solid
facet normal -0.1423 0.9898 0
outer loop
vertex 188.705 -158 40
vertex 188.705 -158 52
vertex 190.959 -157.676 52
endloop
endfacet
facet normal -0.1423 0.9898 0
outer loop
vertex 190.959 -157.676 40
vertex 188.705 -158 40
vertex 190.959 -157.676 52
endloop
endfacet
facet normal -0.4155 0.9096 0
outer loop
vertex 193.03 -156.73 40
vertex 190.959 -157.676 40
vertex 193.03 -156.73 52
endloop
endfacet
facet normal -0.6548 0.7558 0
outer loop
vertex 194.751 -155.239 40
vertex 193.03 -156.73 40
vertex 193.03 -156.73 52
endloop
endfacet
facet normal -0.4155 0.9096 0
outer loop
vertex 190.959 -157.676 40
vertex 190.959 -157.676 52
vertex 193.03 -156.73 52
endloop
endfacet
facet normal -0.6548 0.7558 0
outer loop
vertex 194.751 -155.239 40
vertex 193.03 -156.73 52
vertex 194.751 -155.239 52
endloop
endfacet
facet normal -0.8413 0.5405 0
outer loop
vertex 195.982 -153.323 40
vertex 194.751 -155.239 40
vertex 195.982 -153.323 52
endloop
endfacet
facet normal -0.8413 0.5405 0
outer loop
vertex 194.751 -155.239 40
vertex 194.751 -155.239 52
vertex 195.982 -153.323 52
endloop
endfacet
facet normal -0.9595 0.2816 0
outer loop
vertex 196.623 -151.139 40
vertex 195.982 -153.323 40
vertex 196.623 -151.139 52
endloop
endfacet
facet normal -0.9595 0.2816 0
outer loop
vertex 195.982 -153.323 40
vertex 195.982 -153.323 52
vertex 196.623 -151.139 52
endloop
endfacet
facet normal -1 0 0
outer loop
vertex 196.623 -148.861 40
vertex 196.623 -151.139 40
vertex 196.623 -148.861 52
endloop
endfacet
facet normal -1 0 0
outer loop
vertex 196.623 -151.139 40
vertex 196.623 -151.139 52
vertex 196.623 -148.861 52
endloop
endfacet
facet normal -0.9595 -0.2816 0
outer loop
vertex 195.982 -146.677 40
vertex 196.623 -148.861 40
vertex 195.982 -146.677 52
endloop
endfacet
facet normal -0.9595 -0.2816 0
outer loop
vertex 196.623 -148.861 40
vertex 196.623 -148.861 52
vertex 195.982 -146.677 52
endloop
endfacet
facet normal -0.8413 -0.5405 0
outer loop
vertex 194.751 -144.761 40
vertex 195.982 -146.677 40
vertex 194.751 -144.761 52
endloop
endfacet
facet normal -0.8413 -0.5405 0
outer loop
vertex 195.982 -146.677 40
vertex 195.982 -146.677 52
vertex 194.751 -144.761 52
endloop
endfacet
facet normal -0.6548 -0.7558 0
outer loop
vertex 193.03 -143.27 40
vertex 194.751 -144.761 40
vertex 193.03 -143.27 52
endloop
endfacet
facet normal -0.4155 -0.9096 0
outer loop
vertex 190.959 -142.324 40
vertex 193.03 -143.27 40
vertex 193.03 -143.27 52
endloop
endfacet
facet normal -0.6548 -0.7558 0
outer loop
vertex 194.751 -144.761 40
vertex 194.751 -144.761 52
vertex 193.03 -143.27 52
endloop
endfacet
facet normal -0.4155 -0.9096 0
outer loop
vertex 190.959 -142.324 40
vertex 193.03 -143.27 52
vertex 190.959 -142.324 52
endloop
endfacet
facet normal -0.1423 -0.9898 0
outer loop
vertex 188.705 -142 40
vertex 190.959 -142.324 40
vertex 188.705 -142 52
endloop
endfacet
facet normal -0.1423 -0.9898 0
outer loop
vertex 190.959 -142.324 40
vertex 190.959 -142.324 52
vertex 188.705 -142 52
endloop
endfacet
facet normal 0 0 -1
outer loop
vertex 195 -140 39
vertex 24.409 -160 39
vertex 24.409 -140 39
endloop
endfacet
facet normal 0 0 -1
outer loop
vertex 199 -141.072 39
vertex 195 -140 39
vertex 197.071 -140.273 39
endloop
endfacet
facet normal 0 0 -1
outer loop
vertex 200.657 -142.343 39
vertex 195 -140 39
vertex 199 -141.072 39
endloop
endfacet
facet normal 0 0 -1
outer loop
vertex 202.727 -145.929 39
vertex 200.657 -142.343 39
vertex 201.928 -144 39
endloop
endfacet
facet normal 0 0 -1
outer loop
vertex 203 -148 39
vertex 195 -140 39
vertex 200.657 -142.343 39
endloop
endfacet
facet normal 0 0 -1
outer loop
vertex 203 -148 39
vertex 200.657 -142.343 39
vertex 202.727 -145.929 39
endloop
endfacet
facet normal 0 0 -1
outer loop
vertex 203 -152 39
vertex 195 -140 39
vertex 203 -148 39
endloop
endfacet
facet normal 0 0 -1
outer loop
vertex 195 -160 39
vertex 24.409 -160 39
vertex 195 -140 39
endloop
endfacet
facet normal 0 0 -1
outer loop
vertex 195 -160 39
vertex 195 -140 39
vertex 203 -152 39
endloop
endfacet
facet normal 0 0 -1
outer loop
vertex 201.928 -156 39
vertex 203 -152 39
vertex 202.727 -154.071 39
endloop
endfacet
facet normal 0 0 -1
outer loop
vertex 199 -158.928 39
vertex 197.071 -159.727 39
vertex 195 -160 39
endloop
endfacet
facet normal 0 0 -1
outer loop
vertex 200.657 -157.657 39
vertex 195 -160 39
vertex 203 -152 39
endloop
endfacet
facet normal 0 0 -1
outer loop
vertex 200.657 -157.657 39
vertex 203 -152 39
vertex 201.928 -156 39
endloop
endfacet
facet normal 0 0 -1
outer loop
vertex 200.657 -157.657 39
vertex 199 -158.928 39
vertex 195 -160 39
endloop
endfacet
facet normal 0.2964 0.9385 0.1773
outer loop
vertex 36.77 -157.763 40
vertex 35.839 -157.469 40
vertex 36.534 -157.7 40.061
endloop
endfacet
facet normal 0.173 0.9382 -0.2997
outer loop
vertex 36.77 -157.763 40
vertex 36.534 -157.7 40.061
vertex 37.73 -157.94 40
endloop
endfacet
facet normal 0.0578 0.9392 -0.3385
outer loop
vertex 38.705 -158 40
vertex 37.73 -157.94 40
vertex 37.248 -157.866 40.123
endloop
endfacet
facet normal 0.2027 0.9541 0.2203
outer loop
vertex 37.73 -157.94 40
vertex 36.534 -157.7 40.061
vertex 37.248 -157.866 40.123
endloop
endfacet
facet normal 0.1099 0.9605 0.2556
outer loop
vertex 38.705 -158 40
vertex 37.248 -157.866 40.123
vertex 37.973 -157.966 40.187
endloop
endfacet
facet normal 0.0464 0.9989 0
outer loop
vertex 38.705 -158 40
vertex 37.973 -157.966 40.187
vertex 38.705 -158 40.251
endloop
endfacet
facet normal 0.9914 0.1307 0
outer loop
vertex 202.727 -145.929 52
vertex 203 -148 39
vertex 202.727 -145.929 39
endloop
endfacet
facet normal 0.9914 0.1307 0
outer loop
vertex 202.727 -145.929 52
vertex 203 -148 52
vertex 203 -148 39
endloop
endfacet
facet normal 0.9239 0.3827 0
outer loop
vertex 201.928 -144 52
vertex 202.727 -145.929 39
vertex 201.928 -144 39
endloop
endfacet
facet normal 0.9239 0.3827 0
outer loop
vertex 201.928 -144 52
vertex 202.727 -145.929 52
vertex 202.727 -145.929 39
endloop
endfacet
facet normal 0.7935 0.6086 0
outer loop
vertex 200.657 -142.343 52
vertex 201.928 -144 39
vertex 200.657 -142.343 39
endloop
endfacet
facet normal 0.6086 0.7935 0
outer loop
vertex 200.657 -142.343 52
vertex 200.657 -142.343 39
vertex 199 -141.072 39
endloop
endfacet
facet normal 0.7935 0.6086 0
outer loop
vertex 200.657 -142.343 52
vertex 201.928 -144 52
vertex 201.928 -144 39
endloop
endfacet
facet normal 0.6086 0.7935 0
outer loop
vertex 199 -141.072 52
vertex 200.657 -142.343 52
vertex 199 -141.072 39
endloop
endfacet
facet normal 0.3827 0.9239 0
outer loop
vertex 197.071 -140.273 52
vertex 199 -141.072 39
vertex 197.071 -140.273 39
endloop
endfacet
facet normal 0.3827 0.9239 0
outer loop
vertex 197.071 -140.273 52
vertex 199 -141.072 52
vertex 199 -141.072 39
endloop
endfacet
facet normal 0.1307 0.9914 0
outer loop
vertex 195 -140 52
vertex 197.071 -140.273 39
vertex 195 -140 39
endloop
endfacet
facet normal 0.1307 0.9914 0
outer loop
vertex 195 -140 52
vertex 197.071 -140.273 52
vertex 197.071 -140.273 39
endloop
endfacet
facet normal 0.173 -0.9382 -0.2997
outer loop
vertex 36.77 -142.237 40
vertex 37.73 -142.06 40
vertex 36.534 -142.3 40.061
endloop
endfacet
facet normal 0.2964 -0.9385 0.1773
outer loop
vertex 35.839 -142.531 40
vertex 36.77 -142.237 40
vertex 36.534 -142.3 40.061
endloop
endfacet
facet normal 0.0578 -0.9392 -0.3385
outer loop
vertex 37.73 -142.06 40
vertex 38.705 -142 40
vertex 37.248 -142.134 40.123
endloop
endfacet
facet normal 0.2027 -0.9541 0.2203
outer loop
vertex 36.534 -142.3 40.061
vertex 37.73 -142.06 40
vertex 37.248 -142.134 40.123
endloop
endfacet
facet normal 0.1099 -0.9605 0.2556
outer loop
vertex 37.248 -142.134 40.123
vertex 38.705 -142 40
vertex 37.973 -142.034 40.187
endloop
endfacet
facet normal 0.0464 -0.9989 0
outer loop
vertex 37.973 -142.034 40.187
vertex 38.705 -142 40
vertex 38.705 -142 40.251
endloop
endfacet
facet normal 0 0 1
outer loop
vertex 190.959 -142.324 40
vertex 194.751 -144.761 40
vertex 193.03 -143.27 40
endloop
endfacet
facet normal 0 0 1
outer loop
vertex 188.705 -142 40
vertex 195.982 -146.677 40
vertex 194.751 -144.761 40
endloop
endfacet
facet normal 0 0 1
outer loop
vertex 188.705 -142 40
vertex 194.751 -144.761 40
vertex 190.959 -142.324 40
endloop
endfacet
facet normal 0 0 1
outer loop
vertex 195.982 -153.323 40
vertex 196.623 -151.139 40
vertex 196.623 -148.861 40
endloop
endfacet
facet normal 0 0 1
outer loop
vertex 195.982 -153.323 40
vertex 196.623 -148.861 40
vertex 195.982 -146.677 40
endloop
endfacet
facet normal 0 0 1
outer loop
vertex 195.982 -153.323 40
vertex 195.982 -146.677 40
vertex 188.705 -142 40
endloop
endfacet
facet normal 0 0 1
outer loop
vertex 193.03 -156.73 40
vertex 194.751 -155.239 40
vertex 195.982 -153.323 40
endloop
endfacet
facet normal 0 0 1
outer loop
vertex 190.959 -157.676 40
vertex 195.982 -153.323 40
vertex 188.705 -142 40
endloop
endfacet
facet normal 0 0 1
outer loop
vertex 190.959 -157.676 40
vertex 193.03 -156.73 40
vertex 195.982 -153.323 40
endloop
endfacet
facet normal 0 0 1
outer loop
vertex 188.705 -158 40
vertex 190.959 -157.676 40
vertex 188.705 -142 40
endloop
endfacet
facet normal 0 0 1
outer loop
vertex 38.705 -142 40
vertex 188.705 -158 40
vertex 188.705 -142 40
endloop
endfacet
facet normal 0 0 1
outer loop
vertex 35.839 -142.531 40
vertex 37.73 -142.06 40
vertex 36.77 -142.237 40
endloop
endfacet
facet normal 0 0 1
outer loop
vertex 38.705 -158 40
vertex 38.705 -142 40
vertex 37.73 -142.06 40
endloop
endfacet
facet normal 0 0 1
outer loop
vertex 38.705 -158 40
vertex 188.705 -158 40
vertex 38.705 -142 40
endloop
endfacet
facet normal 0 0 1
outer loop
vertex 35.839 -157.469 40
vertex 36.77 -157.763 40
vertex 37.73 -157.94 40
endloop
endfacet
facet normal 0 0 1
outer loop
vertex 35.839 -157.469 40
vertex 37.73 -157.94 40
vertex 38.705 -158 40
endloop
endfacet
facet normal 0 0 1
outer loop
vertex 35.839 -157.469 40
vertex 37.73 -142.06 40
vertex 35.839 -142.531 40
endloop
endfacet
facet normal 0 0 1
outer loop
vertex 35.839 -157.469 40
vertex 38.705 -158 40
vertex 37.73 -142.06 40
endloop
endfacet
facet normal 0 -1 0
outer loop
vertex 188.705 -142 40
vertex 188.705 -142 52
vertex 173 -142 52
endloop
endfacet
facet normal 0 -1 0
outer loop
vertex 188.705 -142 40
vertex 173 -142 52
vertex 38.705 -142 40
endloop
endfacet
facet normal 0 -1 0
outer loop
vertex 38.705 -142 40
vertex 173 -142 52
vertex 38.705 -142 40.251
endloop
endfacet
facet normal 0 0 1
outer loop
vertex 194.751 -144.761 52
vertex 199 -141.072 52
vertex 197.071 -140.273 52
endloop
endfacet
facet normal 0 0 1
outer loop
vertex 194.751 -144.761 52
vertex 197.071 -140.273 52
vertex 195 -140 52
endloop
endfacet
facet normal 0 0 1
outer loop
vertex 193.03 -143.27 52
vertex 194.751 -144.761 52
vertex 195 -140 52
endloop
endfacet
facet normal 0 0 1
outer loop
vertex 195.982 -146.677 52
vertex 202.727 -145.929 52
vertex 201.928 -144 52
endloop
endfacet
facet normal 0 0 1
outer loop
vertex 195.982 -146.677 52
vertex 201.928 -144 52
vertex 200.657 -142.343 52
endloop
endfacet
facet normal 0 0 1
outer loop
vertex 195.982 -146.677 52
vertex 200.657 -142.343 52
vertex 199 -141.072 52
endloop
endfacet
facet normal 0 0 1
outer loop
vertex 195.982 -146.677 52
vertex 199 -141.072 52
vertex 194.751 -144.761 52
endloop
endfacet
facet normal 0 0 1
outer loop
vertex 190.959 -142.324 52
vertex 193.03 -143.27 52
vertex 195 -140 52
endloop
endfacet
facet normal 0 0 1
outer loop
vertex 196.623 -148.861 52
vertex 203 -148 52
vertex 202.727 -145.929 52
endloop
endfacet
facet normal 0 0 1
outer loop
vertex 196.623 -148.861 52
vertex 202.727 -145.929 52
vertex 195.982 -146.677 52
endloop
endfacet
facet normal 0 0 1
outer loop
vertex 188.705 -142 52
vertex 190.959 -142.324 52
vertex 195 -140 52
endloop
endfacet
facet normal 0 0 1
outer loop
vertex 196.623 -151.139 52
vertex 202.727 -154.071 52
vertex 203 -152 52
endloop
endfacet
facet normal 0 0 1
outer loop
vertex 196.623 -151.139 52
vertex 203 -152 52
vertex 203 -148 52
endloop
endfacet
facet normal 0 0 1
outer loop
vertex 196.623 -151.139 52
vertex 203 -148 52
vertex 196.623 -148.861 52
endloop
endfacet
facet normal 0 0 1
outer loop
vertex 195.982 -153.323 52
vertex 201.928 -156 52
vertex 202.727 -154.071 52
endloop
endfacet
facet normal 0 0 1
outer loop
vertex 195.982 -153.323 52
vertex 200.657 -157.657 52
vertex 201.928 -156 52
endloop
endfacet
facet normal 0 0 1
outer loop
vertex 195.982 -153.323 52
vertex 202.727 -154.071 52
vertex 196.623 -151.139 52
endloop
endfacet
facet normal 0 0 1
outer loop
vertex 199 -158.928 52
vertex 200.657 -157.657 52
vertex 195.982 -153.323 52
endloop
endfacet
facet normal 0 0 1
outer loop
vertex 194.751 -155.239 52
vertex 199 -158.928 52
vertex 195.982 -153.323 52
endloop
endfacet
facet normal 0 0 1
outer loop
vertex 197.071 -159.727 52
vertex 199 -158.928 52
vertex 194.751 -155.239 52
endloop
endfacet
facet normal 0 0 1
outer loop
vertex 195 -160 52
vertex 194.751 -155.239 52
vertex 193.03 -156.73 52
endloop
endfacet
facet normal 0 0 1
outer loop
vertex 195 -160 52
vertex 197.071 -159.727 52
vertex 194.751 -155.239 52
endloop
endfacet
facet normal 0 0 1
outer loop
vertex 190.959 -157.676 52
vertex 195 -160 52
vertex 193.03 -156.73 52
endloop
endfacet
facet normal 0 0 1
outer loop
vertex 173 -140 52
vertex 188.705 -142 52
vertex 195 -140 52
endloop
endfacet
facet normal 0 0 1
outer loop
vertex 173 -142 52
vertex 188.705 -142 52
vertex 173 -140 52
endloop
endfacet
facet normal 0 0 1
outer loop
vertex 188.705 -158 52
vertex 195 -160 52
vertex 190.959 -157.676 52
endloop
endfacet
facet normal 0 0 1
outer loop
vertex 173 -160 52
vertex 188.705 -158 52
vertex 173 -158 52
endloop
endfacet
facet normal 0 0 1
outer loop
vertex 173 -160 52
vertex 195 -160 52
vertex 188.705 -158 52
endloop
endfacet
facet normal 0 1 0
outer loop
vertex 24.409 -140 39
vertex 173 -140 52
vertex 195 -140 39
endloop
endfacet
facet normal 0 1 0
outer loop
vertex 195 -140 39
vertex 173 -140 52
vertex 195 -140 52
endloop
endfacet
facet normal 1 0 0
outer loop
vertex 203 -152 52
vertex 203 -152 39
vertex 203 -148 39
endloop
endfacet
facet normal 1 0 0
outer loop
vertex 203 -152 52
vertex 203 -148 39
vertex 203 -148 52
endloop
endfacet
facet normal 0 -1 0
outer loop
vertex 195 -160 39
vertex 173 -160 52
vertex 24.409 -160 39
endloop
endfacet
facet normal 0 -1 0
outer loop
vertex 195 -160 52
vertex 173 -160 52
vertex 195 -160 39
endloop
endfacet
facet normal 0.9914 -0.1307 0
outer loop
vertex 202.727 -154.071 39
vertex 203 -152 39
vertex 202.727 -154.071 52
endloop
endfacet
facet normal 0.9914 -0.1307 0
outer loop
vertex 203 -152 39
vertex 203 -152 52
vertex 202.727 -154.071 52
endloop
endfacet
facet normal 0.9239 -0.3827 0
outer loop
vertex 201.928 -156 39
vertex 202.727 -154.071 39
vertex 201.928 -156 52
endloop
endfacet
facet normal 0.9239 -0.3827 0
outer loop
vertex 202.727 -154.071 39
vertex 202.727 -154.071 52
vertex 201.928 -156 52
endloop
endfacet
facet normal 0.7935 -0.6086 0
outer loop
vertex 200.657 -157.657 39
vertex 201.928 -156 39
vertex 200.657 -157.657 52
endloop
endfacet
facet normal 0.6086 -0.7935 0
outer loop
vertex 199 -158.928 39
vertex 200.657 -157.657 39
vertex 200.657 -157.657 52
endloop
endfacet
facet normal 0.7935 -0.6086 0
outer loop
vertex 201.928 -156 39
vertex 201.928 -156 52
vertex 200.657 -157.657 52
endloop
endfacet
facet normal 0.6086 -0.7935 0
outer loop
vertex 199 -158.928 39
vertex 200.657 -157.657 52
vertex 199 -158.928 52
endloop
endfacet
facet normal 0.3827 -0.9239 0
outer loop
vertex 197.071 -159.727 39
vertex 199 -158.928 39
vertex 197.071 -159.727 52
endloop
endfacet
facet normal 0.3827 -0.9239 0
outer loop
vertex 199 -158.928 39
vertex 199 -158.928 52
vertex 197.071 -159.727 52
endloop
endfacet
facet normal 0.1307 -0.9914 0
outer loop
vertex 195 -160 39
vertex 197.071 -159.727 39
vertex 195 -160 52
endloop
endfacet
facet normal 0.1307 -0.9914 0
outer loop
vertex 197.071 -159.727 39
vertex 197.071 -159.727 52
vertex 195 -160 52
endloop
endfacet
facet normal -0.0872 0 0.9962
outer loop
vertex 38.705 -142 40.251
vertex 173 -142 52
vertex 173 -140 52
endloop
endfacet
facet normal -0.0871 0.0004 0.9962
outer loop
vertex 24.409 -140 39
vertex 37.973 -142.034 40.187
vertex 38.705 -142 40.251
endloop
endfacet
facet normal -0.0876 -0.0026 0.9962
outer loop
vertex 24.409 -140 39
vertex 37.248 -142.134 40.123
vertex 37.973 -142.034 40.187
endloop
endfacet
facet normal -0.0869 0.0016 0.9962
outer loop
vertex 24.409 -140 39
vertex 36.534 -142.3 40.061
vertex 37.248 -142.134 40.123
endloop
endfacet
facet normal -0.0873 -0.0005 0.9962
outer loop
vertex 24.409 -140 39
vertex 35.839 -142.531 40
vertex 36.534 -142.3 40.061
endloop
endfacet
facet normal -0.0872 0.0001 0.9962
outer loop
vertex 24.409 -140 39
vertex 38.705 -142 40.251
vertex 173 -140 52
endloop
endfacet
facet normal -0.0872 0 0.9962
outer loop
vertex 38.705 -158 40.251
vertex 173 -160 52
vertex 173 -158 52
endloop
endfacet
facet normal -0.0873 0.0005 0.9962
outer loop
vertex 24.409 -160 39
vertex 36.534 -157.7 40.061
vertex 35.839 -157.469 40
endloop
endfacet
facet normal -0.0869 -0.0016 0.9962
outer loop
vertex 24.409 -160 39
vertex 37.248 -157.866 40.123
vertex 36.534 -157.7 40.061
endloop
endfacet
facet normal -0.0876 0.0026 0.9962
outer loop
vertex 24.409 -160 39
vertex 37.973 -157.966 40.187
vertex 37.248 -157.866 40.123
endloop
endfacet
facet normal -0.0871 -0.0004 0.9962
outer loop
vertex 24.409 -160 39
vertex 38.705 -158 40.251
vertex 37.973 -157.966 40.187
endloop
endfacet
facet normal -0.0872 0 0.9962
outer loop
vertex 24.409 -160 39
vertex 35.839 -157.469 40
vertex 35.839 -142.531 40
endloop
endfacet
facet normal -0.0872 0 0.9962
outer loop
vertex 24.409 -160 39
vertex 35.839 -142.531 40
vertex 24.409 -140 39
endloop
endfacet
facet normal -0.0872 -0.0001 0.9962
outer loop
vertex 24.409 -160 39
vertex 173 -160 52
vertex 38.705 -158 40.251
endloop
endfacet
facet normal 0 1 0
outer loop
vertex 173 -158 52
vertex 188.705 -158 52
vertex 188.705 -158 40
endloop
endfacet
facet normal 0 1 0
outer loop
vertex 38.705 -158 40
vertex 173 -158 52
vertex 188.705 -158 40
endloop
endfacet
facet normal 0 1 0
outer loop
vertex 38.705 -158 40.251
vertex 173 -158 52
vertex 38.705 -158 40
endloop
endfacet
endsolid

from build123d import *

# Parameters (mm, degrees)
PAD127_DEPTH            = 10
FILLET002_R             = 8
POCKET105_DEPTH         = 12
BODY089_PLACEMENT_ANGLE = 270


with BuildPart() as part:
    # Sketch257 → Pad127 (new body, symmetric)
    with BuildSketch(Plane.YZ):
        Polygon((0, 13), (-148.59068, 0), (30, 0), (30, 13), align=None)
    extrude(amount=PAD127_DEPTH, both=True)

    # Fillet002
    fillet002_edges = [part.edges().sort_by_distance(p)[0] for p in [
        (10, 30, 6.5),
        (-10, 30, 6.5),
    ]]
    fillet(fillet002_edges, radius=FILLET002_R)

    # Sketch258 (on Face8 of Fillet002) → Pocket105 (cut)
    with BuildSketch(Plane(origin=(0, 0, 13), x_dir=(0, -1, 0), z_dir=(0, 0, 1))):
        with BuildLine():
            ThreePointArc((-15.70466, 8), (-23.70466, 0), (-15.70466, -8))
            Line((-15.70466, -8), (134.29534, -8))
            ThreePointArc((134.29534, -8), (142.29534, 0), (134.29534, 8))
            Line((-15.70466, 8), (134.29534, 8))
        make_face()
    extrude(amount=-POCKET105_DEPTH, mode=Mode.SUBTRACT)


with BuildPart() as part_1:
    # Body089 placement: moved
    add(part.part.moved(Location((173, -150, 39))).rotate(Axis((173, -150, 39), (0, 0, 1)), BODY089_PLACEMENT_ANGLE))


solid = part_1.part
